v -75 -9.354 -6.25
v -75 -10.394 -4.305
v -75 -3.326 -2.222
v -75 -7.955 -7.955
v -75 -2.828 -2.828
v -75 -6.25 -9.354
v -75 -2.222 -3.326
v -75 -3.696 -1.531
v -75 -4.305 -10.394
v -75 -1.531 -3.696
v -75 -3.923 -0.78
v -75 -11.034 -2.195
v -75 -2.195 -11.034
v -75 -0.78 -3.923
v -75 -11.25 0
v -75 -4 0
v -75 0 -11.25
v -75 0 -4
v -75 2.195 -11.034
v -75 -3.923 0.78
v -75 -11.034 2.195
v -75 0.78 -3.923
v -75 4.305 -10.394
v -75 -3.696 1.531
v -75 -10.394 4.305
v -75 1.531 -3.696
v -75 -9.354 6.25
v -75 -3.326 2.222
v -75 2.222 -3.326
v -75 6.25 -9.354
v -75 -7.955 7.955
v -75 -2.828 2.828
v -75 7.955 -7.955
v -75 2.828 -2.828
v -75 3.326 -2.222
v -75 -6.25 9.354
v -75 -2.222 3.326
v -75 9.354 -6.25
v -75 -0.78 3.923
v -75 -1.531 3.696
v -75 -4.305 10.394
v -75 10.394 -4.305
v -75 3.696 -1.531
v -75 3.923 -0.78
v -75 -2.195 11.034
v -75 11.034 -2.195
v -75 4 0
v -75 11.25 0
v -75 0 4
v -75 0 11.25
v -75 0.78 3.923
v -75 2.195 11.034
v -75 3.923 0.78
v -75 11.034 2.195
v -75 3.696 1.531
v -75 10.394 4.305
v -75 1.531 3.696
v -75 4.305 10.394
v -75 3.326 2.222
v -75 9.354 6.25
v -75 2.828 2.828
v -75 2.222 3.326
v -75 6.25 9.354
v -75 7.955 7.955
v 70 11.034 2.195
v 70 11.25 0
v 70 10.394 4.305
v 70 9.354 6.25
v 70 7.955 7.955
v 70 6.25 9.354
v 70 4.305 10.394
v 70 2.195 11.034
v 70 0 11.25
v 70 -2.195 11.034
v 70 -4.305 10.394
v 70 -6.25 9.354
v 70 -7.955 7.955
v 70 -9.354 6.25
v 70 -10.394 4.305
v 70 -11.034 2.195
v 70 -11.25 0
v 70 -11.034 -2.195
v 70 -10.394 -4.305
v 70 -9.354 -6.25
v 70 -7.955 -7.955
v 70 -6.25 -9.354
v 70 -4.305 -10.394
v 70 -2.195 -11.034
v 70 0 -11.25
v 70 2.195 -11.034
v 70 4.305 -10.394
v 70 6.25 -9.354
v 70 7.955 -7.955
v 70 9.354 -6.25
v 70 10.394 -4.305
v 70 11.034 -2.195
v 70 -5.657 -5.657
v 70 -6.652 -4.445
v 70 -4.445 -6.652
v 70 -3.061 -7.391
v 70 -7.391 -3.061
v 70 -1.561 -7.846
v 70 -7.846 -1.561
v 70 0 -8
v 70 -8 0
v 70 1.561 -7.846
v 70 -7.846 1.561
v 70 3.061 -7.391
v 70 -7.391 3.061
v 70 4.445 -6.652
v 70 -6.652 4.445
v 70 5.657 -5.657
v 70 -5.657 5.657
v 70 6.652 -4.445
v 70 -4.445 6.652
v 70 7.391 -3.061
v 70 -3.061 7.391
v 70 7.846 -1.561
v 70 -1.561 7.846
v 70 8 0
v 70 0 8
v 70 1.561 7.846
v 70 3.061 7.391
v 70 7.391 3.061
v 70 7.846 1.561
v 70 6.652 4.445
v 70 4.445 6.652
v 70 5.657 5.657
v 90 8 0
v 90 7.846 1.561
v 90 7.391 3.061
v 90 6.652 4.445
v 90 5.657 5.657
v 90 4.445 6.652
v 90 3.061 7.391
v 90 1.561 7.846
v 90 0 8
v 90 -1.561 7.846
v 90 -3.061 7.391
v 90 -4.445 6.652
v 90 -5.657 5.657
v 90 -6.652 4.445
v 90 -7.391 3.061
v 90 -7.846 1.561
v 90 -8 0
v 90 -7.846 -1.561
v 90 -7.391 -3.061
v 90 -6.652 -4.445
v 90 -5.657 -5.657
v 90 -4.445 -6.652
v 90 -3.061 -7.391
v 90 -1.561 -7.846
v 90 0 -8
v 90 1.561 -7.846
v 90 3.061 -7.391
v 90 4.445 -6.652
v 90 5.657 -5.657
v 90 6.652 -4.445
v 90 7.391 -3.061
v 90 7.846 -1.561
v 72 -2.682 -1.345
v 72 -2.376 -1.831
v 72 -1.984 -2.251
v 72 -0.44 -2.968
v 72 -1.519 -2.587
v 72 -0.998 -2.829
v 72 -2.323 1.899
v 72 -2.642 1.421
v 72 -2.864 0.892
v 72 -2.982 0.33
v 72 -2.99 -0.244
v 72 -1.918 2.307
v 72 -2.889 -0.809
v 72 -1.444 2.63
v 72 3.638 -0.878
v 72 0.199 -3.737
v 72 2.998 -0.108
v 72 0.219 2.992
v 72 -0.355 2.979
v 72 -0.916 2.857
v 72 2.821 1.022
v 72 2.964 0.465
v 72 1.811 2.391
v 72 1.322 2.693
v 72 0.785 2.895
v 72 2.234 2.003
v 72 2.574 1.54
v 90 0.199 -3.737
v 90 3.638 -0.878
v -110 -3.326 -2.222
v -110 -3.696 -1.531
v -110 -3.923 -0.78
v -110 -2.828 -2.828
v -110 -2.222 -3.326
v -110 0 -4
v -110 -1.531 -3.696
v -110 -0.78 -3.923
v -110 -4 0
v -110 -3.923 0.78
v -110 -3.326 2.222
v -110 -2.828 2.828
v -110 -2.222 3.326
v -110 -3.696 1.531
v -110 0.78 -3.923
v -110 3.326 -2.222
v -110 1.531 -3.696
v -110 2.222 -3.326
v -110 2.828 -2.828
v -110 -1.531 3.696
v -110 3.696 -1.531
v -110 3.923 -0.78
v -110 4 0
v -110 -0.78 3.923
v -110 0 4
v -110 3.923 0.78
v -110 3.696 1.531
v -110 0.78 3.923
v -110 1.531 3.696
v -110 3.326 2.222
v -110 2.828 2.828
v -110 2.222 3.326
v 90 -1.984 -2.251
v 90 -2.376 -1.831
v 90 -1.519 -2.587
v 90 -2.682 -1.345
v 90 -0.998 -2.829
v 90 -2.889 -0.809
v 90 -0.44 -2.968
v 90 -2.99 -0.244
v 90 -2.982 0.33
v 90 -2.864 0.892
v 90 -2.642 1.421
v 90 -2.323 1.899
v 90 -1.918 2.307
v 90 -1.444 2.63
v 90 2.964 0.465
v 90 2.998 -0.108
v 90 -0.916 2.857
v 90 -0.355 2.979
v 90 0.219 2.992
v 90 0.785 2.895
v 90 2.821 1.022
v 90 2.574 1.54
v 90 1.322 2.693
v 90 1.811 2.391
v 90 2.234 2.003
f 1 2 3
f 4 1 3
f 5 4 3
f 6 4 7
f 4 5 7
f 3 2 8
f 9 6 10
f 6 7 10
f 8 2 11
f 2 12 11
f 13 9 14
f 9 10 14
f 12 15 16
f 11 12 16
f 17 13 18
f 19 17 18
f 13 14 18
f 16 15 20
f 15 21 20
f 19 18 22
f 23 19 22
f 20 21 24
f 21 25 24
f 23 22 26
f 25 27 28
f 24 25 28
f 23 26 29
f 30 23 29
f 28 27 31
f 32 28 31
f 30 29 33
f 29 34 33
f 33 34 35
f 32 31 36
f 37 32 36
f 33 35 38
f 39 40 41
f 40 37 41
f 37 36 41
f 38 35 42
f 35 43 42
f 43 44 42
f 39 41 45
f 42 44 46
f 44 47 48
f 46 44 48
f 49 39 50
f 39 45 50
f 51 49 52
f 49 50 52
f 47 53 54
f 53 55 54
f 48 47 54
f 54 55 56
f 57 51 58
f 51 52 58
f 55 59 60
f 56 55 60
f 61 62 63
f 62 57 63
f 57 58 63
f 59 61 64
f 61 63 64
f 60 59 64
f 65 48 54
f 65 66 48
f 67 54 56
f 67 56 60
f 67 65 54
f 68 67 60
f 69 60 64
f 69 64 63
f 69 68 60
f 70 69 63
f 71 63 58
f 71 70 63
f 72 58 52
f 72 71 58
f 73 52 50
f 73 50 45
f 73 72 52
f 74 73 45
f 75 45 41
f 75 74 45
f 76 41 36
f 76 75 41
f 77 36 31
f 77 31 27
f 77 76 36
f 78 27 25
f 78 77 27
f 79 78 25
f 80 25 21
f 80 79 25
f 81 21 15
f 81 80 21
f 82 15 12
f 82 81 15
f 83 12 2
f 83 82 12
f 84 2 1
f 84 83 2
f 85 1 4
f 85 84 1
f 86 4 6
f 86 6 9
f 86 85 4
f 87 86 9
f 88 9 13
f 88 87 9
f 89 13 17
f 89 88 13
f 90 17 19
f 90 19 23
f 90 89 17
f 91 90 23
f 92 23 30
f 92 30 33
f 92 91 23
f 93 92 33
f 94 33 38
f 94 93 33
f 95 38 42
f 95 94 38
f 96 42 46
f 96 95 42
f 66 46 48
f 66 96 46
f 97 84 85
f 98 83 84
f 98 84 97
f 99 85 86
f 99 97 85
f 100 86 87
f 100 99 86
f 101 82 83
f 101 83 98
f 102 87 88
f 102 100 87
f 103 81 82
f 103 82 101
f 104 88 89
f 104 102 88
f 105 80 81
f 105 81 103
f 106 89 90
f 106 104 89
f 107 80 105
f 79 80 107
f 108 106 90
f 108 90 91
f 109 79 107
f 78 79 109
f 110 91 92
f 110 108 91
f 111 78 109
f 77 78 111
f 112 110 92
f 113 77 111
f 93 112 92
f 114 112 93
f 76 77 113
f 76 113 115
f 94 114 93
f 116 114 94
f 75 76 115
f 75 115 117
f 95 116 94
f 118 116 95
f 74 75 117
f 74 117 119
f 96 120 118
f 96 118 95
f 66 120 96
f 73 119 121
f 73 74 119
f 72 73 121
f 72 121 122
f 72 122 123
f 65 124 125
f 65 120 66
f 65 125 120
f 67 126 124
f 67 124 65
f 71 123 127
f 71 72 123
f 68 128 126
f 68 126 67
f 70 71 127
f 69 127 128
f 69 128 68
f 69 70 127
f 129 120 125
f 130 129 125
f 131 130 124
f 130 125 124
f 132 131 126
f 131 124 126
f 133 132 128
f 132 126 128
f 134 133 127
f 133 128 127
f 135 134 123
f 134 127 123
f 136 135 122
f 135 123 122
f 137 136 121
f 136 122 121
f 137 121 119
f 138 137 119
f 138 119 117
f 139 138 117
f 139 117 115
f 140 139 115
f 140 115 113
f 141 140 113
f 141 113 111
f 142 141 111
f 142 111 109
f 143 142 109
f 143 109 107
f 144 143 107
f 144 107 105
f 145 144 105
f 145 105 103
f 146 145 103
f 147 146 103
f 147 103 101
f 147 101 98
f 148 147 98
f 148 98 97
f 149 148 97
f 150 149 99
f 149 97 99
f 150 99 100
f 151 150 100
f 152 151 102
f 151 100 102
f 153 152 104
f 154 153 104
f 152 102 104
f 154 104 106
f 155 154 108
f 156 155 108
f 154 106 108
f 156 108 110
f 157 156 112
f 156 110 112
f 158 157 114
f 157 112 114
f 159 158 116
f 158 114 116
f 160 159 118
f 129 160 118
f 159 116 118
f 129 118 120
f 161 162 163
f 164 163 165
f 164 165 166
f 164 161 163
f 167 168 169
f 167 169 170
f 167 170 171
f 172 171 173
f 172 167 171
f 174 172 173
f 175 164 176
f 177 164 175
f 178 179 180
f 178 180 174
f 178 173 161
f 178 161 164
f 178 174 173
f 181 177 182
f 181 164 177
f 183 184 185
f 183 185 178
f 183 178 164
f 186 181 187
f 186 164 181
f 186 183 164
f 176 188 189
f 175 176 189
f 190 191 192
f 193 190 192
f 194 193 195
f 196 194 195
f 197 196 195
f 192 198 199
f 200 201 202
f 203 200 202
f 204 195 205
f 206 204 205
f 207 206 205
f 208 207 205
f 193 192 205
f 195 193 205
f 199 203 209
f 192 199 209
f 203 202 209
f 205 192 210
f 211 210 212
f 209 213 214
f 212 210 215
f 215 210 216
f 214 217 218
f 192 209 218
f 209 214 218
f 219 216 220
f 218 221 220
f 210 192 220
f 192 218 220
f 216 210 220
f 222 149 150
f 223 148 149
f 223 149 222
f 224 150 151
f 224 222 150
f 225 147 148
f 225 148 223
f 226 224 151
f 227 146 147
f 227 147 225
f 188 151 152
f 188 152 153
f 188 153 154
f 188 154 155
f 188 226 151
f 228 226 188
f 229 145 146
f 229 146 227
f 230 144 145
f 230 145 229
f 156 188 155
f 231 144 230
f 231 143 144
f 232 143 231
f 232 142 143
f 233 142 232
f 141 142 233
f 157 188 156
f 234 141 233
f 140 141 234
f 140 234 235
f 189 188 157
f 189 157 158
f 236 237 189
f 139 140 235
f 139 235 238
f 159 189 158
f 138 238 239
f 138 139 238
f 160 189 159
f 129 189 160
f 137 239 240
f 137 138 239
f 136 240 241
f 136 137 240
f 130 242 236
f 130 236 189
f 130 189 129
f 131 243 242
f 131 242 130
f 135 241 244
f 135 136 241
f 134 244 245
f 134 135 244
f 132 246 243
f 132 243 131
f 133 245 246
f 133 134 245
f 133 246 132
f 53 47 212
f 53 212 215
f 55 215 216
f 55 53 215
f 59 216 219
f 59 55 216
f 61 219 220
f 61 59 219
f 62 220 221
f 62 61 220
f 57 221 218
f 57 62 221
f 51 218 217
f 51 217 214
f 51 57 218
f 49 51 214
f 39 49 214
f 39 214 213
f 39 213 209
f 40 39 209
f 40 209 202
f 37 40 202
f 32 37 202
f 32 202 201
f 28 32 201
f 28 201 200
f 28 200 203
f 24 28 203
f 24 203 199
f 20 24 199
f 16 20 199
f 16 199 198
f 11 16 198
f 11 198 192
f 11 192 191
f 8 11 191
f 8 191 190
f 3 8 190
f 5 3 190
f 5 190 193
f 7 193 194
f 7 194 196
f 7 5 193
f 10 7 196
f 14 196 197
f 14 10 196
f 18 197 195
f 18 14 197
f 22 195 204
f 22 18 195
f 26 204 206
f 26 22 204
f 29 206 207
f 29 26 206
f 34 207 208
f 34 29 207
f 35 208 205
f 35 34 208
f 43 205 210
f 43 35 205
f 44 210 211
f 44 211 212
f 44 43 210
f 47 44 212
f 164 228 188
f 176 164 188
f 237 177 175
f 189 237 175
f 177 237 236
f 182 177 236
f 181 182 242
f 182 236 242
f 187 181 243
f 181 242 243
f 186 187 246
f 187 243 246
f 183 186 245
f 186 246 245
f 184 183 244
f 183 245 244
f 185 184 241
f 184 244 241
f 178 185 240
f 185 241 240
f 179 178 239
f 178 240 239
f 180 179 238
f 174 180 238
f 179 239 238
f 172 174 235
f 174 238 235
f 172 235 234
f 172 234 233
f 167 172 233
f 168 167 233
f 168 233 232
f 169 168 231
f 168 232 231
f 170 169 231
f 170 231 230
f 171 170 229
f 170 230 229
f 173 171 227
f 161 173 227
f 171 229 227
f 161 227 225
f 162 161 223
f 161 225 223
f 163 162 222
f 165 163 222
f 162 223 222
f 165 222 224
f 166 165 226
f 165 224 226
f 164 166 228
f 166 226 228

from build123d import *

# Parameters (mm, degrees)
SKETCH_R          = 4
PAD_DEPTH         = 110
SKETCH001_R       = 11.25
PAD001_DEPTH      = 70
PAD001_DEPTH_BACK = 75
SKETCH003_R       = 8
PAD002_DEPTH      = 90
POCKET_DEPTH      = 18


with BuildPart() as part:
    # Sketch → Pad (new body)
    with BuildSketch(Plane.YZ):
        Circle(SKETCH_R)
    extrude(amount=-PAD_DEPTH)

    # Sketch001 → Pad001 (join, two sides)
    with BuildSketch(Plane.YZ) as pad001_sk:
        Circle(SKETCH001_R)
    extrude(amount=PAD001_DEPTH)
    extrude(pad001_sk.sketch, amount=-PAD001_DEPTH_BACK)

    # Sketch003 → Pad002 (join)
    with BuildSketch(Plane.YZ):
        Circle(SKETCH003_R)
    extrude(amount=PAD002_DEPTH)

    # Sketch002 → Pocket (cut)
    with BuildSketch(Plane.YZ.offset(90)):
        with BuildLine():
            ThreePointArc((2.99806, -0.107877), (-1.918287, 2.306551), (-0.44036, -2.967505))
            Line((-0.44036, -2.967505), (0.198883, -3.73651))
            Line((0.198883, -3.73651), (3.637995, -0.877715))
            Line((2.99806, -0.107877), (3.637995, -0.877715))
        make_face()
    extrude(amount=-POCKET_DEPTH, mode=Mode.SUBTRACT)


solid = part.part
